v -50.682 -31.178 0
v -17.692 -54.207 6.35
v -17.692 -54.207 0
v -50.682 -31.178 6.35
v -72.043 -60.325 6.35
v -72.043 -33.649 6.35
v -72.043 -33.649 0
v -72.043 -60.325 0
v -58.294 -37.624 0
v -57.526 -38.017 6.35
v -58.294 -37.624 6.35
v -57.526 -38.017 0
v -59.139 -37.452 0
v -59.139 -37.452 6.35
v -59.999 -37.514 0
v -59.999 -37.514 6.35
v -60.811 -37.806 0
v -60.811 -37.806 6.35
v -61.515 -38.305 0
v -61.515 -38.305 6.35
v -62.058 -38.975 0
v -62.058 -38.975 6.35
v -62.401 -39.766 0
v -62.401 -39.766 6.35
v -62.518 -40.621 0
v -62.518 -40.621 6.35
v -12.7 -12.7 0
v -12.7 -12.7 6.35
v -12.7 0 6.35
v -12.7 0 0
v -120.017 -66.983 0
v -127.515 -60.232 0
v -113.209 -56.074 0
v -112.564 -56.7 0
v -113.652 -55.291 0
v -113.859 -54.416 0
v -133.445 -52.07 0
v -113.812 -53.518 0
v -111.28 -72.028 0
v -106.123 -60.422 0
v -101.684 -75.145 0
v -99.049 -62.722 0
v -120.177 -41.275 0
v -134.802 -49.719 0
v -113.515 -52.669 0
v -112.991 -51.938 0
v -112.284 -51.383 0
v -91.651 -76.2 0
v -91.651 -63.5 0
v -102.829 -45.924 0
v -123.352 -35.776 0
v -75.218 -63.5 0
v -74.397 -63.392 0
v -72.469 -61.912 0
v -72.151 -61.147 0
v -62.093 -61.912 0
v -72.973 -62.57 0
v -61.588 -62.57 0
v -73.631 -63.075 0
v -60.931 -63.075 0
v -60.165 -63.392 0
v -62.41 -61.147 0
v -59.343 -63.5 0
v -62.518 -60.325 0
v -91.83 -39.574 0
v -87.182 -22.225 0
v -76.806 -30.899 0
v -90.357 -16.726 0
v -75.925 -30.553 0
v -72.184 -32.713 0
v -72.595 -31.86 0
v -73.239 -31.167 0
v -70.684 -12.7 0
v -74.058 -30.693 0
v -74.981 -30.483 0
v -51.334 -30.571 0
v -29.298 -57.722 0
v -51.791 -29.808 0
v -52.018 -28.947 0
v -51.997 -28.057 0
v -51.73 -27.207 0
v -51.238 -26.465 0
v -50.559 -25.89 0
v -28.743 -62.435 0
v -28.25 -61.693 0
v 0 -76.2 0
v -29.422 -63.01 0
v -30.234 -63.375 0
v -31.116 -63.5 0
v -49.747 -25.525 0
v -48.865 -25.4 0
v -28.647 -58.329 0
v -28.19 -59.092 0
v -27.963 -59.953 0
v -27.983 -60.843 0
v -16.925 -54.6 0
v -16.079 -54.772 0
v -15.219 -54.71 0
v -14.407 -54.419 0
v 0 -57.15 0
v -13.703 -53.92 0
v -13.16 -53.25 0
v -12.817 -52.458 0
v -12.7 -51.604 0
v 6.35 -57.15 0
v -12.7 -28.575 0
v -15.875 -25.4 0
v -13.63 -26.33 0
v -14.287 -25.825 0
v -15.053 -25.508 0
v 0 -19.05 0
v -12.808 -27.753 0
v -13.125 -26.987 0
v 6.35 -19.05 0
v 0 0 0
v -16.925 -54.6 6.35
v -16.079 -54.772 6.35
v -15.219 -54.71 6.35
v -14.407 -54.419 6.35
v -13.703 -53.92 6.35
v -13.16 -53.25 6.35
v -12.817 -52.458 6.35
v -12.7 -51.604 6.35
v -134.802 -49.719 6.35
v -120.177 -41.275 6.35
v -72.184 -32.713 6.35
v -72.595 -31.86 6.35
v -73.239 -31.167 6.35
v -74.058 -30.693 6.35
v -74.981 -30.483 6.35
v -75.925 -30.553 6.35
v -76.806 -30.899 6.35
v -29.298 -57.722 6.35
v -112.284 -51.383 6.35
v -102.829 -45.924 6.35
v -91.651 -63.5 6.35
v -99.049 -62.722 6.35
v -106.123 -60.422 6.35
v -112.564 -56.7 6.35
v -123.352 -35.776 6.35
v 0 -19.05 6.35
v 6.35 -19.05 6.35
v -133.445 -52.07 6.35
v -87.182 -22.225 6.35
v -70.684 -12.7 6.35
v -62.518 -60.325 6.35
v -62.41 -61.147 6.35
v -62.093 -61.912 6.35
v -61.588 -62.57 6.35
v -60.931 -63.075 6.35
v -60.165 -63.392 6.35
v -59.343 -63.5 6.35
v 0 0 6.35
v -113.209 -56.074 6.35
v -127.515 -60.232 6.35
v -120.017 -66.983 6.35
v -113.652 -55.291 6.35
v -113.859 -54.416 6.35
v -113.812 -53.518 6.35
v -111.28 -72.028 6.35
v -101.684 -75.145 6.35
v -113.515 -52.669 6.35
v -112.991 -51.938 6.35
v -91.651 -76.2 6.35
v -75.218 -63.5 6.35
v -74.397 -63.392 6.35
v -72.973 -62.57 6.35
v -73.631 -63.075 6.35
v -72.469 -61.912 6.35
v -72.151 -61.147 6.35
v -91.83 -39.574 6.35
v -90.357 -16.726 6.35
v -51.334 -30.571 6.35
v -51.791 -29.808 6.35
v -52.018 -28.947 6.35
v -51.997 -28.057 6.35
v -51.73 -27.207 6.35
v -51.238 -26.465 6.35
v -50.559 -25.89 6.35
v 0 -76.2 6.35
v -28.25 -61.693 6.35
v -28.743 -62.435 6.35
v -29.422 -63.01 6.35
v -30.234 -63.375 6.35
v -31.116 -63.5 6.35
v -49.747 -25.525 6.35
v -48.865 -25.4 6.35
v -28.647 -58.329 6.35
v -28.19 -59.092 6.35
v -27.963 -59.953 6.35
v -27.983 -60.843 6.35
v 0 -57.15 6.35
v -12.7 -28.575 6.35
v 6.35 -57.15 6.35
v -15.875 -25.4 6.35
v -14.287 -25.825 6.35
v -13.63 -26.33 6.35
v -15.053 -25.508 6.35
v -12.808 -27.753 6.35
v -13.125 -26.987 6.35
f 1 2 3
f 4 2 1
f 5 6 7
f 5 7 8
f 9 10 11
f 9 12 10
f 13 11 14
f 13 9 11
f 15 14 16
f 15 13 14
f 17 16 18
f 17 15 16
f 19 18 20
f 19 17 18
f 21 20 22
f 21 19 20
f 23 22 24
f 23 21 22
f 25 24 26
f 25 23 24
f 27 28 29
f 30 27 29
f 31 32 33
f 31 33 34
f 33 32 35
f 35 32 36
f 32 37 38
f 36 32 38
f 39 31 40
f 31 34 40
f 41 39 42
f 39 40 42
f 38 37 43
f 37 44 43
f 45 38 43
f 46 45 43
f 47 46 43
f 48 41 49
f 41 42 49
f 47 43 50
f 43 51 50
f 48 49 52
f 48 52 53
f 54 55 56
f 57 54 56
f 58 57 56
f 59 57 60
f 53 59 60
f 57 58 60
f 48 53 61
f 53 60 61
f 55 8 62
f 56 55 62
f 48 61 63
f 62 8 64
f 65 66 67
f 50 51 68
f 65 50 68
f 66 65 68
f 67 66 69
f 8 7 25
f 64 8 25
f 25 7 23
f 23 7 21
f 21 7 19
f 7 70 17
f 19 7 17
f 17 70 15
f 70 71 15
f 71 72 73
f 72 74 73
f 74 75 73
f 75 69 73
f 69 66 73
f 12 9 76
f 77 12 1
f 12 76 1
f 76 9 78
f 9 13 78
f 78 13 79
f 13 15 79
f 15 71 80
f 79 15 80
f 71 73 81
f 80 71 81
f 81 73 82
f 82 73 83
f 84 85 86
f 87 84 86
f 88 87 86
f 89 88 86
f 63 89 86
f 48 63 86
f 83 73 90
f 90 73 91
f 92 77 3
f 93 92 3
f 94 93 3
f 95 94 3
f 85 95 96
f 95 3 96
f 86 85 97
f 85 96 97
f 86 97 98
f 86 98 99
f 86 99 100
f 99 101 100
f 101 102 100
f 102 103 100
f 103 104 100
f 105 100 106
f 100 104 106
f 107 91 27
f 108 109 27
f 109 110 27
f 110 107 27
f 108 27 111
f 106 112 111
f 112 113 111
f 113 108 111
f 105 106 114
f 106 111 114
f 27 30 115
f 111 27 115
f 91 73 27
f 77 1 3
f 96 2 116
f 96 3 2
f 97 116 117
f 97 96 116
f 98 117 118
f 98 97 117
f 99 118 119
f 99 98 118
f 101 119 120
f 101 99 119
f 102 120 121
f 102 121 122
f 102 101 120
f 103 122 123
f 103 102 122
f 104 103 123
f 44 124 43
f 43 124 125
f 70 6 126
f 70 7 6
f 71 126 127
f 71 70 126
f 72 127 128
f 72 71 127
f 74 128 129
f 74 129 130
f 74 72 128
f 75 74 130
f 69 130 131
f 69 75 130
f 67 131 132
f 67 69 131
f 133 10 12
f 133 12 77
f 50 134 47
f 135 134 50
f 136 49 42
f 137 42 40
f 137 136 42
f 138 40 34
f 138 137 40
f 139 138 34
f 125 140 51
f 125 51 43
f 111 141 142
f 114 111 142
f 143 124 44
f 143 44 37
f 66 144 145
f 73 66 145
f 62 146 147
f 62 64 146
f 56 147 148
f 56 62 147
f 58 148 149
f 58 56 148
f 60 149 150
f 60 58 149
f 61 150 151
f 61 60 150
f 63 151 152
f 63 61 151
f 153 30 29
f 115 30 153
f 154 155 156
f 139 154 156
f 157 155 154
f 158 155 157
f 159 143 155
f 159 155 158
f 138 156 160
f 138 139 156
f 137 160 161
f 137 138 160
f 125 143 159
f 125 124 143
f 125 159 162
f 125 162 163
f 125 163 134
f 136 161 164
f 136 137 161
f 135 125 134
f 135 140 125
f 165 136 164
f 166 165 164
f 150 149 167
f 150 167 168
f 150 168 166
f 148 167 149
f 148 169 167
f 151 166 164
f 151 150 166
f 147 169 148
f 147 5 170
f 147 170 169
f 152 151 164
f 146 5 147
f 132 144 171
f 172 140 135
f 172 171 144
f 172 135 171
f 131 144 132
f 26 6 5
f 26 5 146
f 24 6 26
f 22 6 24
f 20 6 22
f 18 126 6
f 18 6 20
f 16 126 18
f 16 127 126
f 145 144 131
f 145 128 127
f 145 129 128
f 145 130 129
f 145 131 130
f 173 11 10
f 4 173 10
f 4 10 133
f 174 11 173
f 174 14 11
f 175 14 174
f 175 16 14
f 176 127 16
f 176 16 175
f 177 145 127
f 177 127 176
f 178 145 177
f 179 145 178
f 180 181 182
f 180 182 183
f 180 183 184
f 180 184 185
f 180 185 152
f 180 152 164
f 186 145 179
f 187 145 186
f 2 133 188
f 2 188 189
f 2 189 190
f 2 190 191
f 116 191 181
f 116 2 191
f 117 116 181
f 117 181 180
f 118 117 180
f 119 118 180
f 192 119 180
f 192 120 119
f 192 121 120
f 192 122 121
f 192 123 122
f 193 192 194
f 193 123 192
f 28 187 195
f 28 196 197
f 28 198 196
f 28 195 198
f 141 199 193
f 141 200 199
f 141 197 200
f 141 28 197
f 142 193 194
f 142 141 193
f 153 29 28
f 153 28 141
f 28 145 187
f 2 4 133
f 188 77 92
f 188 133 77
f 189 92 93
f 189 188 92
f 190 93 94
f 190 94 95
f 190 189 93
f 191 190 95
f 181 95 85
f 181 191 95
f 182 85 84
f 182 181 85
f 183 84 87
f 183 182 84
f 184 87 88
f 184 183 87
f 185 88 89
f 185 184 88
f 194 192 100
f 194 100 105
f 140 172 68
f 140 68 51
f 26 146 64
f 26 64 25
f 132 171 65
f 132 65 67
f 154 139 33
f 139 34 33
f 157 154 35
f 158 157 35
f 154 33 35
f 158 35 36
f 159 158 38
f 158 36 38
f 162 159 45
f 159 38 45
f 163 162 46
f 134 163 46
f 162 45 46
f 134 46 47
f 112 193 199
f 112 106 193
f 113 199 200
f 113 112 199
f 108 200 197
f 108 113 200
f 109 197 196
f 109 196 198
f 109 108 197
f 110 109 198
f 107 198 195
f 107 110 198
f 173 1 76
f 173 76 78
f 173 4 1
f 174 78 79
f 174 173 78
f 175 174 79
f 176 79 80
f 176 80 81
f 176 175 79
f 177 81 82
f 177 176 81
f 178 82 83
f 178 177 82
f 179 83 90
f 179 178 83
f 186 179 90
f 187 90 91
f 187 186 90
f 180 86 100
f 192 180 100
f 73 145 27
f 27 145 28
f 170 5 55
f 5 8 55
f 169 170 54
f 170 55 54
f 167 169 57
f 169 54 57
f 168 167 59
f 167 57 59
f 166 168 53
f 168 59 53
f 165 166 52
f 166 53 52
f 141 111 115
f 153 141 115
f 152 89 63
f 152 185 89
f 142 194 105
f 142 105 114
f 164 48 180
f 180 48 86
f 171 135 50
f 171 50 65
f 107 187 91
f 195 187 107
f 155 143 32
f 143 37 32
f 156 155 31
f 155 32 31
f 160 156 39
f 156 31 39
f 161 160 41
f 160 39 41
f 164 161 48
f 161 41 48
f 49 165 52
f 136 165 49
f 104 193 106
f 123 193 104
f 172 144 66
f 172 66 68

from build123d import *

# Parameters (mm, degrees)
SKETCH1_W           = 152.4
SKETCH1_H           = 76.2
BOSS_EXTRUDE1_DEPTH = 6.35
SKETCH2_W           = 6.35
SKETCH2_H           = 38.1
BOSS_EXTRUDE2_DEPTH = 6.35
CUT_EXTRUDE1_DEPTH  = 7.35
CUT_EXTRUDE2_DEPTH  = 7.35
BOSS_EXTRUDE3_DEPTH = 6.35
CUT_EXTRUDE3_DEPTH  = 7.35
FILLET1_R           = 48.26
CUT_EXTRUDE4_DEPTH  = 7.35
EXTRUDE_THIN2_DEPTH = 6.35
FILLET2_R           = 3.175


with BuildPart() as part:
    # Sketch1 → Boss-Extrude1 (new body)
    with BuildSketch(Plane.XY):
        with Locations((-76.2, -38.1)):
            Rectangle(SKETCH1_W, SKETCH1_H)
    extrude(amount=BOSS_EXTRUDE1_DEPTH)

    # Sketch2 → Boss-Extrude2 (add)
    with BuildSketch(Plane.XY.offset(6.35)):
        with Locations((3.175, -38.1)):
            Rectangle(SKETCH2_W, SKETCH2_H)
    extrude(amount=-BOSS_EXTRUDE2_DEPTH)

    # Sketch3 → Cut-Extrude1 (cut, through all)
    with BuildSketch(Plane.XY.offset(6.35)):
        Polygon((-152.4, -59.878913996), (-70.683723912, -12.7), (-12.7, -12.7), (-12.7, 0), (-152.4, 0), align=None)
    extrude(amount=-CUT_EXTRUDE1_DEPTH, mode=Mode.SUBTRACT)

    # Sketch4 → Cut-Extrude2 (cut, through all)
    with BuildSketch(Plane.XY.offset(6.35)):
        Polygon((-152.4, -59.878913996), (-133.35, -76.2), (-152.4, -76.2), align=None)
    extrude(amount=-CUT_EXTRUDE2_DEPTH, mode=Mode.SUBTRACT)

    # Sketch5 → Boss-Extrude3 (add)
    with BuildSketch(Plane.XY.offset(6.35)):
        Polygon((-87.181507854, -22.225), (-90.356507854, -16.725738686), (-123.352075739, -35.775738686), (-120.177075739, -41.275), align=None)
    extrude(amount=-BOSS_EXTRUDE3_DEPTH)

    # Sketch6 → Cut-Extrude3 (cut, through all)
    with BuildSketch(Plane.XY.offset(6.35)):
        Polygon((-134.802363795, -49.718913996), (-119.513501663, -76.2), (-133.35, -76.2), (-152.4, -59.878913996), align=None)
    extrude(amount=-CUT_EXTRUDE3_DEPTH, mode=Mode.SUBTRACT)

    # Fillet1
    fillet1_edges = [part.edges().sort_by_distance(p)[0] for p in [
        (-119.513501663, -76.2, 3.175),
    ]]
    fillet(fillet1_edges, radius=FILLET1_R)

    # Sketch7 → Cut-Extrude4 (cut, through all)
    with BuildSketch(Plane.XY.offset(6.35)):
        with BuildLine():
            Line((-102.82855311, -45.923522628), (-91.830030482, -39.573522628))
            Line((-91.830030482, -39.573522628), (-67.280769168, -25.4))
            Line((-67.280769168, -25.4), (-12.7, -25.4))
            Line((-12.7, -25.4), (-12.7, -31.75))
            Line((-12.7, -31.75), (-12.7, -44.45))
            Line((-12.7, -44.45), (-12.7, -63.5))
            Line((-12.7, -63.5), (-91.650577671, -63.5))
            ThreePointArc((-91.650577671, -63.5), (-104.882957084, -60.946328713), (-116.214822021, -53.652088587))
            Line((-116.214822021, -53.652088587), (-102.82855311, -45.923522628))
        make_face()
    extrude(amount=-CUT_EXTRUDE4_DEPTH, mode=Mode.SUBTRACT)

    # Sketch8 → Extrude-Thin2 (add)
    with BuildSketch(Plane.XY.offset(6.35)):
        Polygon((-9.974003812, -59.594830217), (-72.043269168, -16.267499985), (-72.043269168, -63.5), (-62.518269168, -63.5), (-62.518269168, -34.532500015), (-15.425996188, -67.405169783), align=None)
    extrude(amount=-EXTRUDE_THIN2_DEPTH)

    # Fillet2
    fillet2_edges = [part.edges().sort_by_distance(p)[0] for p in [
        (-116.214822021, -53.652088587, 3.175),
        (-12.7, -25.4, 3.175),
        (-21.020410111, -63.5, 3.175),
        (-12.7, -57.691953868, 3.175),
        (-58.960359057, -25.4, 3.175),
        (-72.043269168, -63.5, 3.175),
        (-72.043269168, -28.149630657, 3.175),
        (-62.518269168, -34.532500015, 3.175),
        (-62.518269168, -63.5, 3.175),
    ]]
    fillet(fillet2_edges, radius=FILLET2_R)


solid = part.part
